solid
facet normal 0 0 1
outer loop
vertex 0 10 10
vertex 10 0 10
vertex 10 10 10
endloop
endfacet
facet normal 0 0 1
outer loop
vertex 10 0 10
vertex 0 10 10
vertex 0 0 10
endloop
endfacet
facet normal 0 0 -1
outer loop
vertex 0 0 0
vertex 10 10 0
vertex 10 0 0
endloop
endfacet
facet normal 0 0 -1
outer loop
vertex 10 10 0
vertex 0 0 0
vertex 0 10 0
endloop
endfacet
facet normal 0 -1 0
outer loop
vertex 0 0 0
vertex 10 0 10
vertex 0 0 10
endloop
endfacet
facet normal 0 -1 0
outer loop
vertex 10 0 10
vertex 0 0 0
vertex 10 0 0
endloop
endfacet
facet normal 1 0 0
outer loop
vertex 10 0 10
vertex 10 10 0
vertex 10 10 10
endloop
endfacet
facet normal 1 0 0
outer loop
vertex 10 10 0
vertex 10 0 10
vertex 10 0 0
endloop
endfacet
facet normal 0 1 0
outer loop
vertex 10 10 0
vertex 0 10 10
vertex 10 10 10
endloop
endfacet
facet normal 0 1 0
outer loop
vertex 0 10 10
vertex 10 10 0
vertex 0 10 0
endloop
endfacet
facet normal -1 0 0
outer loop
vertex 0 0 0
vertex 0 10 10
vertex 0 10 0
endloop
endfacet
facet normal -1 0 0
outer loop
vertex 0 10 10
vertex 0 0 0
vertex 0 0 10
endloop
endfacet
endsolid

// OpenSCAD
translate([0, 0, 0])  // Ensure correct positioning
cube([10, 10, 10]);   // Maintain correct dimensions and orientation
